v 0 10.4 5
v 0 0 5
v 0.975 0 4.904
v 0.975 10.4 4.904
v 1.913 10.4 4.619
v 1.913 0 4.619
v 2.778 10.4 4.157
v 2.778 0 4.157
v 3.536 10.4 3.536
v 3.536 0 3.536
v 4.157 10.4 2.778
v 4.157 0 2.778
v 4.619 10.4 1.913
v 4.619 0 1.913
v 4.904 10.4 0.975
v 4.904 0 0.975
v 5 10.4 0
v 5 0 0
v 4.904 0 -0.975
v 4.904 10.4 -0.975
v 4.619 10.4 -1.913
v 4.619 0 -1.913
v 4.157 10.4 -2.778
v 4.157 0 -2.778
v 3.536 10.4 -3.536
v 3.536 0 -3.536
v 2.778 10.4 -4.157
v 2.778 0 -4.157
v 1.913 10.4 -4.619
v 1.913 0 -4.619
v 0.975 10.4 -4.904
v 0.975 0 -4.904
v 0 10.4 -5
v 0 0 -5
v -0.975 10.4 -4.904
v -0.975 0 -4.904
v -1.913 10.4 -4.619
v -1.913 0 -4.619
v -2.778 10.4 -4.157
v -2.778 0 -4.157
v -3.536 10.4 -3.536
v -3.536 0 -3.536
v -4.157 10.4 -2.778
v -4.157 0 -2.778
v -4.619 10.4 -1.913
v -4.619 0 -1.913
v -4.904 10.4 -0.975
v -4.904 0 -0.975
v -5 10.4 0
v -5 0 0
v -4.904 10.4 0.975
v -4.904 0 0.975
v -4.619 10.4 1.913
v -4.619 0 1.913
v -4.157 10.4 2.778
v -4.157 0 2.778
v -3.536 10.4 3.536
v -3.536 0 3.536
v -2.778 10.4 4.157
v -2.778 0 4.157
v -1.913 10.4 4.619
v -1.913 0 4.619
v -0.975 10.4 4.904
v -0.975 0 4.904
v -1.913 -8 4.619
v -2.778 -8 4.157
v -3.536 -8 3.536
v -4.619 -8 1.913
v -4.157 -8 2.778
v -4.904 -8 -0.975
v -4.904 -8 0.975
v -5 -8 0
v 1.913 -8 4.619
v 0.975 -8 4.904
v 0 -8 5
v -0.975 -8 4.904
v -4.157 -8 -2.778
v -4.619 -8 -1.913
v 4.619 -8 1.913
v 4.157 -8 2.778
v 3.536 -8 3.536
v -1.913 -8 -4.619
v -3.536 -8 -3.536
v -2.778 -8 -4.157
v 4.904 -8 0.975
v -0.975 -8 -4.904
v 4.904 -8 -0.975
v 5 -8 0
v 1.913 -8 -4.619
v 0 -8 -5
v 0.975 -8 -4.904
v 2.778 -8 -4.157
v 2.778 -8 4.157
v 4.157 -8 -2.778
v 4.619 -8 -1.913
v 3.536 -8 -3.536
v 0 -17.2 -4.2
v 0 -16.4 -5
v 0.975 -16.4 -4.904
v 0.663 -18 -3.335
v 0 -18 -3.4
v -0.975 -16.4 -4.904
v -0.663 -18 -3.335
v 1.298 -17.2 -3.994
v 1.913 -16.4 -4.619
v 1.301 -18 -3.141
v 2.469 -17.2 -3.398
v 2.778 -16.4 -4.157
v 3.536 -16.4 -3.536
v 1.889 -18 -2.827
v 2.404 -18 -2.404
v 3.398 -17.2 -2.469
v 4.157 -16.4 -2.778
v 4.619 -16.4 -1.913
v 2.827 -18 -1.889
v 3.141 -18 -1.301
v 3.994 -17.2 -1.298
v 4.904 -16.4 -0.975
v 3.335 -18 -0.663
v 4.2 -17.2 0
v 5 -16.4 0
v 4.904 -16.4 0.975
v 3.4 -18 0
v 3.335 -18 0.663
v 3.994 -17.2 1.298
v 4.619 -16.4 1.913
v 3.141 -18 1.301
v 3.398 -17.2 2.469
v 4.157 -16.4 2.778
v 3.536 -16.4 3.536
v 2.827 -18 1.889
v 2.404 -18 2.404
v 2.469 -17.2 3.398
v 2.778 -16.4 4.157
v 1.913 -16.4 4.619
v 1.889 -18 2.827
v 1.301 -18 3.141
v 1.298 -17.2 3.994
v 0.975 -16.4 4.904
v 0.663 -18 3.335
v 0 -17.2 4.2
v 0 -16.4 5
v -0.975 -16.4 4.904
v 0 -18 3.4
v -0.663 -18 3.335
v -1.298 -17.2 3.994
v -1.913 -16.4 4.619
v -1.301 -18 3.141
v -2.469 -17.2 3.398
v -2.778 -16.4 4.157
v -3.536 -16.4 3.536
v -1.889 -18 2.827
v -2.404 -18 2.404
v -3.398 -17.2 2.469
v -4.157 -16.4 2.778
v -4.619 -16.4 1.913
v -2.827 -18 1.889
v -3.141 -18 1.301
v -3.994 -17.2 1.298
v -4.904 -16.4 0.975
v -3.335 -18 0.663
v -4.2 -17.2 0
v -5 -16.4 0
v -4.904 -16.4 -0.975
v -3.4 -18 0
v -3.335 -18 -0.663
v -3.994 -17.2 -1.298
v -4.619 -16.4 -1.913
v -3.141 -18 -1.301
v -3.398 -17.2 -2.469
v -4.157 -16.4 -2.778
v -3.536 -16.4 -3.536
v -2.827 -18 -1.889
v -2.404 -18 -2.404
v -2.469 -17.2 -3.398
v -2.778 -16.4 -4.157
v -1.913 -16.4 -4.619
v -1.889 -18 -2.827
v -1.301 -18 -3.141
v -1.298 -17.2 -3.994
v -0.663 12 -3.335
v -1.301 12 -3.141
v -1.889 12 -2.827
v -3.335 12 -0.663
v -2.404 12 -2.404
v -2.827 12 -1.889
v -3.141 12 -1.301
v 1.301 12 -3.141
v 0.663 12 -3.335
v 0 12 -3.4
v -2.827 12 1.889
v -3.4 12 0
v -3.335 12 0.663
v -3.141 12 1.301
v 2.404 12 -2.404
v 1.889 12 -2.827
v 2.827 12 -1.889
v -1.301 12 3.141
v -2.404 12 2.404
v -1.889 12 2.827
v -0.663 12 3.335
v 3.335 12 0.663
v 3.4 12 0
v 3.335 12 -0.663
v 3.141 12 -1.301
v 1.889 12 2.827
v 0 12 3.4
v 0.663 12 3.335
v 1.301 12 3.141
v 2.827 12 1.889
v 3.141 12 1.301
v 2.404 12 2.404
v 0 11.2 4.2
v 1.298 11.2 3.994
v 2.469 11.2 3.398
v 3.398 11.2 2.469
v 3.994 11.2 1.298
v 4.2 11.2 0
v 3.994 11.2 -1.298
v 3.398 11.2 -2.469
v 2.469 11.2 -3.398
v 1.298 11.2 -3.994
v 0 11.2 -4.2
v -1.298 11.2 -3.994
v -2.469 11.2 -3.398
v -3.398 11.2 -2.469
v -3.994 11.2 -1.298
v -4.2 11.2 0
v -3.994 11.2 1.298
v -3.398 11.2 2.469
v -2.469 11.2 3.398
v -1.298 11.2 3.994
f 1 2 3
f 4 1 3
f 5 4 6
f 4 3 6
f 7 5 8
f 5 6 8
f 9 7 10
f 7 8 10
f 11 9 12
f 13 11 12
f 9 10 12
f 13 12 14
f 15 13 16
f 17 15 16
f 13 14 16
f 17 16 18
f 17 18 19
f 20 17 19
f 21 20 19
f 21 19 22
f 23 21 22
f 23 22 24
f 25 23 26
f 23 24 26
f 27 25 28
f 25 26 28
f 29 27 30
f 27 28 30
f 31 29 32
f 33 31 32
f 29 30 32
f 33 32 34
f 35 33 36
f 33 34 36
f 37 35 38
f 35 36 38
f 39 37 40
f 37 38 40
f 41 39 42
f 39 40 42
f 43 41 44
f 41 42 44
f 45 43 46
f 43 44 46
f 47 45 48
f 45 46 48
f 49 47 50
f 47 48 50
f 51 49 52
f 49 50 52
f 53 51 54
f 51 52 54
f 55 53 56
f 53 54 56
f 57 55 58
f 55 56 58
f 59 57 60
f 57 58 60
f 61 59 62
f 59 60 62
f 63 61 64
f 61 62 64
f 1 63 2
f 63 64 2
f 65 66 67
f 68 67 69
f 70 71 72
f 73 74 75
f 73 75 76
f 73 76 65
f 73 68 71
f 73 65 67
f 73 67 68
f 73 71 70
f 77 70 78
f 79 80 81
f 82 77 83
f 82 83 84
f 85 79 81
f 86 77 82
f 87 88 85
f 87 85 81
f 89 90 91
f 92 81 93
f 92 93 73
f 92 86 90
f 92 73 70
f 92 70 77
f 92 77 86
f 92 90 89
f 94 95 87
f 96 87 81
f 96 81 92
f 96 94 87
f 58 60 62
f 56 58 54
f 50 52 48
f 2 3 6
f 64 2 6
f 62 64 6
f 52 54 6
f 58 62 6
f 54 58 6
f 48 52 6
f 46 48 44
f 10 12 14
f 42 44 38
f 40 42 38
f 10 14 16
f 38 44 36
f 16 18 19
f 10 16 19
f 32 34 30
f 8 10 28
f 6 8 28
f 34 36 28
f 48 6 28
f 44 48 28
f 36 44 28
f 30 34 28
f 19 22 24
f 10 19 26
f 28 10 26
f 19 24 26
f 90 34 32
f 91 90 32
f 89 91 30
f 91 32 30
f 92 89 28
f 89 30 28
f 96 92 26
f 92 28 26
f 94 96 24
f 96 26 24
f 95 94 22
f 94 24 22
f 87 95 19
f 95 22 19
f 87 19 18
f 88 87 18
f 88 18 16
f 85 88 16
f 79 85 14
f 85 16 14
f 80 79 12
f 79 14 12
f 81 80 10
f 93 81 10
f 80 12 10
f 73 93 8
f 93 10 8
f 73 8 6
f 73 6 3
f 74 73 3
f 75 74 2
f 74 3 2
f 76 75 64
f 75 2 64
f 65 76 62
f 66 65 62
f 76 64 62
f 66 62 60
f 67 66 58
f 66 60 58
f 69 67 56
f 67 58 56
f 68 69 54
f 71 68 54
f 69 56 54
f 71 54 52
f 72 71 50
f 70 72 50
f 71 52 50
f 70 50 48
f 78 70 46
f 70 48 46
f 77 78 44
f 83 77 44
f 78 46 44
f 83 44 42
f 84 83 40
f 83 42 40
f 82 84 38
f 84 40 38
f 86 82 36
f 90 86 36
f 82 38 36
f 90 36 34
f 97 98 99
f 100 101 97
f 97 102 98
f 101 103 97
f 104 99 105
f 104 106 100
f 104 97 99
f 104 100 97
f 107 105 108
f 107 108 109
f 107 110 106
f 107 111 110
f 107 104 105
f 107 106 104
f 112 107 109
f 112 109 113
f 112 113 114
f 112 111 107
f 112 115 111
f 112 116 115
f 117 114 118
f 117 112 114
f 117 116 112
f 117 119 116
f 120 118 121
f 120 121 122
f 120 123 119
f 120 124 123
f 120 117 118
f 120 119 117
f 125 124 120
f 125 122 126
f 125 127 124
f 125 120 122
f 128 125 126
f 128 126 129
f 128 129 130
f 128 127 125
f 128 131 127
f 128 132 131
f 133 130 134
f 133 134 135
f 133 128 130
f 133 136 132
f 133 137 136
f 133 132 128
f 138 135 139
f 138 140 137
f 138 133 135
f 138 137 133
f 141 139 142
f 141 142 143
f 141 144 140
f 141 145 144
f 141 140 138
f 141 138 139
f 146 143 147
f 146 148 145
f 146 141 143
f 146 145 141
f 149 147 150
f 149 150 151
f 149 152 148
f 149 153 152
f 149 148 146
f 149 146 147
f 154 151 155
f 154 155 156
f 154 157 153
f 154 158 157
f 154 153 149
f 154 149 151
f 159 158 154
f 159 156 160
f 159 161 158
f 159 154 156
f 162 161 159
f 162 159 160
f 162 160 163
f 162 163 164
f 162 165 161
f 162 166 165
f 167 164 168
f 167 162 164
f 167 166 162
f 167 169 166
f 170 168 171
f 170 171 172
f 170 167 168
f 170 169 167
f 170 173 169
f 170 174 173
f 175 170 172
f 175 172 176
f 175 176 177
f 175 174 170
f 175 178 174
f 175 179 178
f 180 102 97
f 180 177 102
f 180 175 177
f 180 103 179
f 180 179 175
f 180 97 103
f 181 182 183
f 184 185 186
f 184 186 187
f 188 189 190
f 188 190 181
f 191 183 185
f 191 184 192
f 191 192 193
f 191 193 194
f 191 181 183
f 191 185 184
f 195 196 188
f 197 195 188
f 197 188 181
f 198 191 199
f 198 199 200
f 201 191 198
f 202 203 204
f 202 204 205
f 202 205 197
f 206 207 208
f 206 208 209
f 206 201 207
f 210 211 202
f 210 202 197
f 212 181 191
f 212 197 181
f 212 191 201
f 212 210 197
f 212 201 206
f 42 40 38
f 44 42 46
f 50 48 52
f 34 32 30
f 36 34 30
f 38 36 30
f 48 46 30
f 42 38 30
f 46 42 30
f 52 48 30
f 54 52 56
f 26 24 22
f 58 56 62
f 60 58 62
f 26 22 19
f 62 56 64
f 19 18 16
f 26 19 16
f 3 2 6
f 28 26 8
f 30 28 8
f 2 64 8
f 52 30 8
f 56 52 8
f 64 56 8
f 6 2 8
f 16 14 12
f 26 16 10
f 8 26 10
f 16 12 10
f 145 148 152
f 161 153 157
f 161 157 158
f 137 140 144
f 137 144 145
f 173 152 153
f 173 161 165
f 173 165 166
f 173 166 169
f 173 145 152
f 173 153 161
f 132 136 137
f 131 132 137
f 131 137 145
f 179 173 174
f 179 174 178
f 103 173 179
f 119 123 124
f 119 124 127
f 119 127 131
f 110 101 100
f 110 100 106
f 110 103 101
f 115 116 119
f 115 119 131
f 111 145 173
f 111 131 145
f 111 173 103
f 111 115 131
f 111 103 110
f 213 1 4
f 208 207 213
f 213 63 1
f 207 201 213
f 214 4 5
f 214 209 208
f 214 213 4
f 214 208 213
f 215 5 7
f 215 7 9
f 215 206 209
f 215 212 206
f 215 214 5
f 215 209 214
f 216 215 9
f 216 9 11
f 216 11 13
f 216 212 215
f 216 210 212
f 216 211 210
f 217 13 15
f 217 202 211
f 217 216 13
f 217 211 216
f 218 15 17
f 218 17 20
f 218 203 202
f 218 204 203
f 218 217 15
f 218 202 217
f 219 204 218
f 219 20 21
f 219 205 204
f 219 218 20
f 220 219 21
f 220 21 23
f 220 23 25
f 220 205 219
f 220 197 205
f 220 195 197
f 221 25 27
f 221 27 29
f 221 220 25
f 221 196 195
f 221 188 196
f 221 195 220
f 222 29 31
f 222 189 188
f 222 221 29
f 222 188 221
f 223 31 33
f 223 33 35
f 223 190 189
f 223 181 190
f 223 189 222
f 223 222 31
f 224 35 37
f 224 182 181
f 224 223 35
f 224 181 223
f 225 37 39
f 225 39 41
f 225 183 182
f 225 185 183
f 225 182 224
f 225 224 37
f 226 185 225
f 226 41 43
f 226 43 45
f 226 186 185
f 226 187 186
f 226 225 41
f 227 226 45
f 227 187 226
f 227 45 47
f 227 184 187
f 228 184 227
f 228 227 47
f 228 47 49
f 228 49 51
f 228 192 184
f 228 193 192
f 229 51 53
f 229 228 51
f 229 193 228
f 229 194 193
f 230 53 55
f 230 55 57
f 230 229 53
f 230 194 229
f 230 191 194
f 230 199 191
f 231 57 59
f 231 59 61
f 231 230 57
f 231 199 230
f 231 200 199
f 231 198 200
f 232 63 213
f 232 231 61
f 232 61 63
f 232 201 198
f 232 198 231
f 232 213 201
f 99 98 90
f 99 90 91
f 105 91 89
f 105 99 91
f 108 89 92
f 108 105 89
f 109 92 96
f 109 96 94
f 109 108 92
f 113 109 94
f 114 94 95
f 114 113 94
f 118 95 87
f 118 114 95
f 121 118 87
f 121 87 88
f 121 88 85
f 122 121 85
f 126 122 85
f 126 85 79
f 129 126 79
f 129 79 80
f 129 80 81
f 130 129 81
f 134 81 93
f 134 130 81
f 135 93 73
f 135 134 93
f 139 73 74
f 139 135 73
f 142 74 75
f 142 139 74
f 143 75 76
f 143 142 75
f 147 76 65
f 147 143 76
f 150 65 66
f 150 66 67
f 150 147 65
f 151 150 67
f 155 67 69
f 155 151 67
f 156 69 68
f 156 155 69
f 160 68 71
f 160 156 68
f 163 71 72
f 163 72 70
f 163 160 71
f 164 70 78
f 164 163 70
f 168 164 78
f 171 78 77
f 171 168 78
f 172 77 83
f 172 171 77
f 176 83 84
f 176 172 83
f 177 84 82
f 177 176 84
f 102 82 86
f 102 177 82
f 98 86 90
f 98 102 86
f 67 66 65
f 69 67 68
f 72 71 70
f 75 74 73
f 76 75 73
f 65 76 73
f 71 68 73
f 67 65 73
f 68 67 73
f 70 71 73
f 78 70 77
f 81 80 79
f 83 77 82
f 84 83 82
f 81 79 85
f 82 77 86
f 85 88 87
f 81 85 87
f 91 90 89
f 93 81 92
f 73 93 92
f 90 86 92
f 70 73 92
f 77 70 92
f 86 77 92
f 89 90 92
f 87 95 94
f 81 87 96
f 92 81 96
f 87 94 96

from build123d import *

# Parameters (mm, degrees)
SKETCH_1_R      = 5
EXTRUDE_1_DEPTH = 12
SKETCH_2_R      = 5
EXTRUDE_2_DEPTH = 8
EXTRUDE_START   = 10
SKETCH_3_R      = 5
EXTRUDE_3_DEPTH = 10
CHAMFER_2_SIZE  = 1.6
CHAMFER_3_SIZE  = 1.6


with BuildPart() as part:
    # Эскиз1 → Бобышка-Вытянуть1 (new body)
    with BuildSketch(Plane(origin=(0, 0, 0), x_dir=(1, 0, 0), z_dir=(0, 1, 0))):
        with Locations(Location((0, 0, 0), (0, 0, 270))):
            Circle(SKETCH_1_R)
    extrude(amount=EXTRUDE_1_DEPTH)

    # Фаска2
    chamfer_2_edges = [part.edges().sort_by_distance(p)[0] for p in [
        (0, 12, -5),
    ]]
    chamfer(chamfer_2_edges, length=CHAMFER_2_SIZE)


with BuildPart() as body_2:
    # Эскиз2 → Бобышка-Вытянуть2 (new body)
    with BuildSketch(Plane.XZ):
        with Locations(Location((0, 0, 0), (0, 0, 270))):
            Circle(SKETCH_2_R)
    extrude(amount=EXTRUDE_2_DEPTH)


with BuildPart() as body_3:
    # Эскиз3 → Бобышка-Вытянуть3 (new body)
    with BuildSketch(Plane.XZ.offset(8).offset(EXTRUDE_START)):
        with Locations(Location((0, 0, 0), (0, 0, 270))):
            Circle(SKETCH_3_R)
    extrude(amount=-EXTRUDE_3_DEPTH)

    # Фаска3
    chamfer_3_edges = [body_3.edges().sort_by_distance(p)[0] for p in [
        (0, -18, 5),
    ]]
    chamfer(chamfer_3_edges, length=CHAMFER_3_SIZE)


solid = Compound([part.part, body_2.part, body_3.part])
